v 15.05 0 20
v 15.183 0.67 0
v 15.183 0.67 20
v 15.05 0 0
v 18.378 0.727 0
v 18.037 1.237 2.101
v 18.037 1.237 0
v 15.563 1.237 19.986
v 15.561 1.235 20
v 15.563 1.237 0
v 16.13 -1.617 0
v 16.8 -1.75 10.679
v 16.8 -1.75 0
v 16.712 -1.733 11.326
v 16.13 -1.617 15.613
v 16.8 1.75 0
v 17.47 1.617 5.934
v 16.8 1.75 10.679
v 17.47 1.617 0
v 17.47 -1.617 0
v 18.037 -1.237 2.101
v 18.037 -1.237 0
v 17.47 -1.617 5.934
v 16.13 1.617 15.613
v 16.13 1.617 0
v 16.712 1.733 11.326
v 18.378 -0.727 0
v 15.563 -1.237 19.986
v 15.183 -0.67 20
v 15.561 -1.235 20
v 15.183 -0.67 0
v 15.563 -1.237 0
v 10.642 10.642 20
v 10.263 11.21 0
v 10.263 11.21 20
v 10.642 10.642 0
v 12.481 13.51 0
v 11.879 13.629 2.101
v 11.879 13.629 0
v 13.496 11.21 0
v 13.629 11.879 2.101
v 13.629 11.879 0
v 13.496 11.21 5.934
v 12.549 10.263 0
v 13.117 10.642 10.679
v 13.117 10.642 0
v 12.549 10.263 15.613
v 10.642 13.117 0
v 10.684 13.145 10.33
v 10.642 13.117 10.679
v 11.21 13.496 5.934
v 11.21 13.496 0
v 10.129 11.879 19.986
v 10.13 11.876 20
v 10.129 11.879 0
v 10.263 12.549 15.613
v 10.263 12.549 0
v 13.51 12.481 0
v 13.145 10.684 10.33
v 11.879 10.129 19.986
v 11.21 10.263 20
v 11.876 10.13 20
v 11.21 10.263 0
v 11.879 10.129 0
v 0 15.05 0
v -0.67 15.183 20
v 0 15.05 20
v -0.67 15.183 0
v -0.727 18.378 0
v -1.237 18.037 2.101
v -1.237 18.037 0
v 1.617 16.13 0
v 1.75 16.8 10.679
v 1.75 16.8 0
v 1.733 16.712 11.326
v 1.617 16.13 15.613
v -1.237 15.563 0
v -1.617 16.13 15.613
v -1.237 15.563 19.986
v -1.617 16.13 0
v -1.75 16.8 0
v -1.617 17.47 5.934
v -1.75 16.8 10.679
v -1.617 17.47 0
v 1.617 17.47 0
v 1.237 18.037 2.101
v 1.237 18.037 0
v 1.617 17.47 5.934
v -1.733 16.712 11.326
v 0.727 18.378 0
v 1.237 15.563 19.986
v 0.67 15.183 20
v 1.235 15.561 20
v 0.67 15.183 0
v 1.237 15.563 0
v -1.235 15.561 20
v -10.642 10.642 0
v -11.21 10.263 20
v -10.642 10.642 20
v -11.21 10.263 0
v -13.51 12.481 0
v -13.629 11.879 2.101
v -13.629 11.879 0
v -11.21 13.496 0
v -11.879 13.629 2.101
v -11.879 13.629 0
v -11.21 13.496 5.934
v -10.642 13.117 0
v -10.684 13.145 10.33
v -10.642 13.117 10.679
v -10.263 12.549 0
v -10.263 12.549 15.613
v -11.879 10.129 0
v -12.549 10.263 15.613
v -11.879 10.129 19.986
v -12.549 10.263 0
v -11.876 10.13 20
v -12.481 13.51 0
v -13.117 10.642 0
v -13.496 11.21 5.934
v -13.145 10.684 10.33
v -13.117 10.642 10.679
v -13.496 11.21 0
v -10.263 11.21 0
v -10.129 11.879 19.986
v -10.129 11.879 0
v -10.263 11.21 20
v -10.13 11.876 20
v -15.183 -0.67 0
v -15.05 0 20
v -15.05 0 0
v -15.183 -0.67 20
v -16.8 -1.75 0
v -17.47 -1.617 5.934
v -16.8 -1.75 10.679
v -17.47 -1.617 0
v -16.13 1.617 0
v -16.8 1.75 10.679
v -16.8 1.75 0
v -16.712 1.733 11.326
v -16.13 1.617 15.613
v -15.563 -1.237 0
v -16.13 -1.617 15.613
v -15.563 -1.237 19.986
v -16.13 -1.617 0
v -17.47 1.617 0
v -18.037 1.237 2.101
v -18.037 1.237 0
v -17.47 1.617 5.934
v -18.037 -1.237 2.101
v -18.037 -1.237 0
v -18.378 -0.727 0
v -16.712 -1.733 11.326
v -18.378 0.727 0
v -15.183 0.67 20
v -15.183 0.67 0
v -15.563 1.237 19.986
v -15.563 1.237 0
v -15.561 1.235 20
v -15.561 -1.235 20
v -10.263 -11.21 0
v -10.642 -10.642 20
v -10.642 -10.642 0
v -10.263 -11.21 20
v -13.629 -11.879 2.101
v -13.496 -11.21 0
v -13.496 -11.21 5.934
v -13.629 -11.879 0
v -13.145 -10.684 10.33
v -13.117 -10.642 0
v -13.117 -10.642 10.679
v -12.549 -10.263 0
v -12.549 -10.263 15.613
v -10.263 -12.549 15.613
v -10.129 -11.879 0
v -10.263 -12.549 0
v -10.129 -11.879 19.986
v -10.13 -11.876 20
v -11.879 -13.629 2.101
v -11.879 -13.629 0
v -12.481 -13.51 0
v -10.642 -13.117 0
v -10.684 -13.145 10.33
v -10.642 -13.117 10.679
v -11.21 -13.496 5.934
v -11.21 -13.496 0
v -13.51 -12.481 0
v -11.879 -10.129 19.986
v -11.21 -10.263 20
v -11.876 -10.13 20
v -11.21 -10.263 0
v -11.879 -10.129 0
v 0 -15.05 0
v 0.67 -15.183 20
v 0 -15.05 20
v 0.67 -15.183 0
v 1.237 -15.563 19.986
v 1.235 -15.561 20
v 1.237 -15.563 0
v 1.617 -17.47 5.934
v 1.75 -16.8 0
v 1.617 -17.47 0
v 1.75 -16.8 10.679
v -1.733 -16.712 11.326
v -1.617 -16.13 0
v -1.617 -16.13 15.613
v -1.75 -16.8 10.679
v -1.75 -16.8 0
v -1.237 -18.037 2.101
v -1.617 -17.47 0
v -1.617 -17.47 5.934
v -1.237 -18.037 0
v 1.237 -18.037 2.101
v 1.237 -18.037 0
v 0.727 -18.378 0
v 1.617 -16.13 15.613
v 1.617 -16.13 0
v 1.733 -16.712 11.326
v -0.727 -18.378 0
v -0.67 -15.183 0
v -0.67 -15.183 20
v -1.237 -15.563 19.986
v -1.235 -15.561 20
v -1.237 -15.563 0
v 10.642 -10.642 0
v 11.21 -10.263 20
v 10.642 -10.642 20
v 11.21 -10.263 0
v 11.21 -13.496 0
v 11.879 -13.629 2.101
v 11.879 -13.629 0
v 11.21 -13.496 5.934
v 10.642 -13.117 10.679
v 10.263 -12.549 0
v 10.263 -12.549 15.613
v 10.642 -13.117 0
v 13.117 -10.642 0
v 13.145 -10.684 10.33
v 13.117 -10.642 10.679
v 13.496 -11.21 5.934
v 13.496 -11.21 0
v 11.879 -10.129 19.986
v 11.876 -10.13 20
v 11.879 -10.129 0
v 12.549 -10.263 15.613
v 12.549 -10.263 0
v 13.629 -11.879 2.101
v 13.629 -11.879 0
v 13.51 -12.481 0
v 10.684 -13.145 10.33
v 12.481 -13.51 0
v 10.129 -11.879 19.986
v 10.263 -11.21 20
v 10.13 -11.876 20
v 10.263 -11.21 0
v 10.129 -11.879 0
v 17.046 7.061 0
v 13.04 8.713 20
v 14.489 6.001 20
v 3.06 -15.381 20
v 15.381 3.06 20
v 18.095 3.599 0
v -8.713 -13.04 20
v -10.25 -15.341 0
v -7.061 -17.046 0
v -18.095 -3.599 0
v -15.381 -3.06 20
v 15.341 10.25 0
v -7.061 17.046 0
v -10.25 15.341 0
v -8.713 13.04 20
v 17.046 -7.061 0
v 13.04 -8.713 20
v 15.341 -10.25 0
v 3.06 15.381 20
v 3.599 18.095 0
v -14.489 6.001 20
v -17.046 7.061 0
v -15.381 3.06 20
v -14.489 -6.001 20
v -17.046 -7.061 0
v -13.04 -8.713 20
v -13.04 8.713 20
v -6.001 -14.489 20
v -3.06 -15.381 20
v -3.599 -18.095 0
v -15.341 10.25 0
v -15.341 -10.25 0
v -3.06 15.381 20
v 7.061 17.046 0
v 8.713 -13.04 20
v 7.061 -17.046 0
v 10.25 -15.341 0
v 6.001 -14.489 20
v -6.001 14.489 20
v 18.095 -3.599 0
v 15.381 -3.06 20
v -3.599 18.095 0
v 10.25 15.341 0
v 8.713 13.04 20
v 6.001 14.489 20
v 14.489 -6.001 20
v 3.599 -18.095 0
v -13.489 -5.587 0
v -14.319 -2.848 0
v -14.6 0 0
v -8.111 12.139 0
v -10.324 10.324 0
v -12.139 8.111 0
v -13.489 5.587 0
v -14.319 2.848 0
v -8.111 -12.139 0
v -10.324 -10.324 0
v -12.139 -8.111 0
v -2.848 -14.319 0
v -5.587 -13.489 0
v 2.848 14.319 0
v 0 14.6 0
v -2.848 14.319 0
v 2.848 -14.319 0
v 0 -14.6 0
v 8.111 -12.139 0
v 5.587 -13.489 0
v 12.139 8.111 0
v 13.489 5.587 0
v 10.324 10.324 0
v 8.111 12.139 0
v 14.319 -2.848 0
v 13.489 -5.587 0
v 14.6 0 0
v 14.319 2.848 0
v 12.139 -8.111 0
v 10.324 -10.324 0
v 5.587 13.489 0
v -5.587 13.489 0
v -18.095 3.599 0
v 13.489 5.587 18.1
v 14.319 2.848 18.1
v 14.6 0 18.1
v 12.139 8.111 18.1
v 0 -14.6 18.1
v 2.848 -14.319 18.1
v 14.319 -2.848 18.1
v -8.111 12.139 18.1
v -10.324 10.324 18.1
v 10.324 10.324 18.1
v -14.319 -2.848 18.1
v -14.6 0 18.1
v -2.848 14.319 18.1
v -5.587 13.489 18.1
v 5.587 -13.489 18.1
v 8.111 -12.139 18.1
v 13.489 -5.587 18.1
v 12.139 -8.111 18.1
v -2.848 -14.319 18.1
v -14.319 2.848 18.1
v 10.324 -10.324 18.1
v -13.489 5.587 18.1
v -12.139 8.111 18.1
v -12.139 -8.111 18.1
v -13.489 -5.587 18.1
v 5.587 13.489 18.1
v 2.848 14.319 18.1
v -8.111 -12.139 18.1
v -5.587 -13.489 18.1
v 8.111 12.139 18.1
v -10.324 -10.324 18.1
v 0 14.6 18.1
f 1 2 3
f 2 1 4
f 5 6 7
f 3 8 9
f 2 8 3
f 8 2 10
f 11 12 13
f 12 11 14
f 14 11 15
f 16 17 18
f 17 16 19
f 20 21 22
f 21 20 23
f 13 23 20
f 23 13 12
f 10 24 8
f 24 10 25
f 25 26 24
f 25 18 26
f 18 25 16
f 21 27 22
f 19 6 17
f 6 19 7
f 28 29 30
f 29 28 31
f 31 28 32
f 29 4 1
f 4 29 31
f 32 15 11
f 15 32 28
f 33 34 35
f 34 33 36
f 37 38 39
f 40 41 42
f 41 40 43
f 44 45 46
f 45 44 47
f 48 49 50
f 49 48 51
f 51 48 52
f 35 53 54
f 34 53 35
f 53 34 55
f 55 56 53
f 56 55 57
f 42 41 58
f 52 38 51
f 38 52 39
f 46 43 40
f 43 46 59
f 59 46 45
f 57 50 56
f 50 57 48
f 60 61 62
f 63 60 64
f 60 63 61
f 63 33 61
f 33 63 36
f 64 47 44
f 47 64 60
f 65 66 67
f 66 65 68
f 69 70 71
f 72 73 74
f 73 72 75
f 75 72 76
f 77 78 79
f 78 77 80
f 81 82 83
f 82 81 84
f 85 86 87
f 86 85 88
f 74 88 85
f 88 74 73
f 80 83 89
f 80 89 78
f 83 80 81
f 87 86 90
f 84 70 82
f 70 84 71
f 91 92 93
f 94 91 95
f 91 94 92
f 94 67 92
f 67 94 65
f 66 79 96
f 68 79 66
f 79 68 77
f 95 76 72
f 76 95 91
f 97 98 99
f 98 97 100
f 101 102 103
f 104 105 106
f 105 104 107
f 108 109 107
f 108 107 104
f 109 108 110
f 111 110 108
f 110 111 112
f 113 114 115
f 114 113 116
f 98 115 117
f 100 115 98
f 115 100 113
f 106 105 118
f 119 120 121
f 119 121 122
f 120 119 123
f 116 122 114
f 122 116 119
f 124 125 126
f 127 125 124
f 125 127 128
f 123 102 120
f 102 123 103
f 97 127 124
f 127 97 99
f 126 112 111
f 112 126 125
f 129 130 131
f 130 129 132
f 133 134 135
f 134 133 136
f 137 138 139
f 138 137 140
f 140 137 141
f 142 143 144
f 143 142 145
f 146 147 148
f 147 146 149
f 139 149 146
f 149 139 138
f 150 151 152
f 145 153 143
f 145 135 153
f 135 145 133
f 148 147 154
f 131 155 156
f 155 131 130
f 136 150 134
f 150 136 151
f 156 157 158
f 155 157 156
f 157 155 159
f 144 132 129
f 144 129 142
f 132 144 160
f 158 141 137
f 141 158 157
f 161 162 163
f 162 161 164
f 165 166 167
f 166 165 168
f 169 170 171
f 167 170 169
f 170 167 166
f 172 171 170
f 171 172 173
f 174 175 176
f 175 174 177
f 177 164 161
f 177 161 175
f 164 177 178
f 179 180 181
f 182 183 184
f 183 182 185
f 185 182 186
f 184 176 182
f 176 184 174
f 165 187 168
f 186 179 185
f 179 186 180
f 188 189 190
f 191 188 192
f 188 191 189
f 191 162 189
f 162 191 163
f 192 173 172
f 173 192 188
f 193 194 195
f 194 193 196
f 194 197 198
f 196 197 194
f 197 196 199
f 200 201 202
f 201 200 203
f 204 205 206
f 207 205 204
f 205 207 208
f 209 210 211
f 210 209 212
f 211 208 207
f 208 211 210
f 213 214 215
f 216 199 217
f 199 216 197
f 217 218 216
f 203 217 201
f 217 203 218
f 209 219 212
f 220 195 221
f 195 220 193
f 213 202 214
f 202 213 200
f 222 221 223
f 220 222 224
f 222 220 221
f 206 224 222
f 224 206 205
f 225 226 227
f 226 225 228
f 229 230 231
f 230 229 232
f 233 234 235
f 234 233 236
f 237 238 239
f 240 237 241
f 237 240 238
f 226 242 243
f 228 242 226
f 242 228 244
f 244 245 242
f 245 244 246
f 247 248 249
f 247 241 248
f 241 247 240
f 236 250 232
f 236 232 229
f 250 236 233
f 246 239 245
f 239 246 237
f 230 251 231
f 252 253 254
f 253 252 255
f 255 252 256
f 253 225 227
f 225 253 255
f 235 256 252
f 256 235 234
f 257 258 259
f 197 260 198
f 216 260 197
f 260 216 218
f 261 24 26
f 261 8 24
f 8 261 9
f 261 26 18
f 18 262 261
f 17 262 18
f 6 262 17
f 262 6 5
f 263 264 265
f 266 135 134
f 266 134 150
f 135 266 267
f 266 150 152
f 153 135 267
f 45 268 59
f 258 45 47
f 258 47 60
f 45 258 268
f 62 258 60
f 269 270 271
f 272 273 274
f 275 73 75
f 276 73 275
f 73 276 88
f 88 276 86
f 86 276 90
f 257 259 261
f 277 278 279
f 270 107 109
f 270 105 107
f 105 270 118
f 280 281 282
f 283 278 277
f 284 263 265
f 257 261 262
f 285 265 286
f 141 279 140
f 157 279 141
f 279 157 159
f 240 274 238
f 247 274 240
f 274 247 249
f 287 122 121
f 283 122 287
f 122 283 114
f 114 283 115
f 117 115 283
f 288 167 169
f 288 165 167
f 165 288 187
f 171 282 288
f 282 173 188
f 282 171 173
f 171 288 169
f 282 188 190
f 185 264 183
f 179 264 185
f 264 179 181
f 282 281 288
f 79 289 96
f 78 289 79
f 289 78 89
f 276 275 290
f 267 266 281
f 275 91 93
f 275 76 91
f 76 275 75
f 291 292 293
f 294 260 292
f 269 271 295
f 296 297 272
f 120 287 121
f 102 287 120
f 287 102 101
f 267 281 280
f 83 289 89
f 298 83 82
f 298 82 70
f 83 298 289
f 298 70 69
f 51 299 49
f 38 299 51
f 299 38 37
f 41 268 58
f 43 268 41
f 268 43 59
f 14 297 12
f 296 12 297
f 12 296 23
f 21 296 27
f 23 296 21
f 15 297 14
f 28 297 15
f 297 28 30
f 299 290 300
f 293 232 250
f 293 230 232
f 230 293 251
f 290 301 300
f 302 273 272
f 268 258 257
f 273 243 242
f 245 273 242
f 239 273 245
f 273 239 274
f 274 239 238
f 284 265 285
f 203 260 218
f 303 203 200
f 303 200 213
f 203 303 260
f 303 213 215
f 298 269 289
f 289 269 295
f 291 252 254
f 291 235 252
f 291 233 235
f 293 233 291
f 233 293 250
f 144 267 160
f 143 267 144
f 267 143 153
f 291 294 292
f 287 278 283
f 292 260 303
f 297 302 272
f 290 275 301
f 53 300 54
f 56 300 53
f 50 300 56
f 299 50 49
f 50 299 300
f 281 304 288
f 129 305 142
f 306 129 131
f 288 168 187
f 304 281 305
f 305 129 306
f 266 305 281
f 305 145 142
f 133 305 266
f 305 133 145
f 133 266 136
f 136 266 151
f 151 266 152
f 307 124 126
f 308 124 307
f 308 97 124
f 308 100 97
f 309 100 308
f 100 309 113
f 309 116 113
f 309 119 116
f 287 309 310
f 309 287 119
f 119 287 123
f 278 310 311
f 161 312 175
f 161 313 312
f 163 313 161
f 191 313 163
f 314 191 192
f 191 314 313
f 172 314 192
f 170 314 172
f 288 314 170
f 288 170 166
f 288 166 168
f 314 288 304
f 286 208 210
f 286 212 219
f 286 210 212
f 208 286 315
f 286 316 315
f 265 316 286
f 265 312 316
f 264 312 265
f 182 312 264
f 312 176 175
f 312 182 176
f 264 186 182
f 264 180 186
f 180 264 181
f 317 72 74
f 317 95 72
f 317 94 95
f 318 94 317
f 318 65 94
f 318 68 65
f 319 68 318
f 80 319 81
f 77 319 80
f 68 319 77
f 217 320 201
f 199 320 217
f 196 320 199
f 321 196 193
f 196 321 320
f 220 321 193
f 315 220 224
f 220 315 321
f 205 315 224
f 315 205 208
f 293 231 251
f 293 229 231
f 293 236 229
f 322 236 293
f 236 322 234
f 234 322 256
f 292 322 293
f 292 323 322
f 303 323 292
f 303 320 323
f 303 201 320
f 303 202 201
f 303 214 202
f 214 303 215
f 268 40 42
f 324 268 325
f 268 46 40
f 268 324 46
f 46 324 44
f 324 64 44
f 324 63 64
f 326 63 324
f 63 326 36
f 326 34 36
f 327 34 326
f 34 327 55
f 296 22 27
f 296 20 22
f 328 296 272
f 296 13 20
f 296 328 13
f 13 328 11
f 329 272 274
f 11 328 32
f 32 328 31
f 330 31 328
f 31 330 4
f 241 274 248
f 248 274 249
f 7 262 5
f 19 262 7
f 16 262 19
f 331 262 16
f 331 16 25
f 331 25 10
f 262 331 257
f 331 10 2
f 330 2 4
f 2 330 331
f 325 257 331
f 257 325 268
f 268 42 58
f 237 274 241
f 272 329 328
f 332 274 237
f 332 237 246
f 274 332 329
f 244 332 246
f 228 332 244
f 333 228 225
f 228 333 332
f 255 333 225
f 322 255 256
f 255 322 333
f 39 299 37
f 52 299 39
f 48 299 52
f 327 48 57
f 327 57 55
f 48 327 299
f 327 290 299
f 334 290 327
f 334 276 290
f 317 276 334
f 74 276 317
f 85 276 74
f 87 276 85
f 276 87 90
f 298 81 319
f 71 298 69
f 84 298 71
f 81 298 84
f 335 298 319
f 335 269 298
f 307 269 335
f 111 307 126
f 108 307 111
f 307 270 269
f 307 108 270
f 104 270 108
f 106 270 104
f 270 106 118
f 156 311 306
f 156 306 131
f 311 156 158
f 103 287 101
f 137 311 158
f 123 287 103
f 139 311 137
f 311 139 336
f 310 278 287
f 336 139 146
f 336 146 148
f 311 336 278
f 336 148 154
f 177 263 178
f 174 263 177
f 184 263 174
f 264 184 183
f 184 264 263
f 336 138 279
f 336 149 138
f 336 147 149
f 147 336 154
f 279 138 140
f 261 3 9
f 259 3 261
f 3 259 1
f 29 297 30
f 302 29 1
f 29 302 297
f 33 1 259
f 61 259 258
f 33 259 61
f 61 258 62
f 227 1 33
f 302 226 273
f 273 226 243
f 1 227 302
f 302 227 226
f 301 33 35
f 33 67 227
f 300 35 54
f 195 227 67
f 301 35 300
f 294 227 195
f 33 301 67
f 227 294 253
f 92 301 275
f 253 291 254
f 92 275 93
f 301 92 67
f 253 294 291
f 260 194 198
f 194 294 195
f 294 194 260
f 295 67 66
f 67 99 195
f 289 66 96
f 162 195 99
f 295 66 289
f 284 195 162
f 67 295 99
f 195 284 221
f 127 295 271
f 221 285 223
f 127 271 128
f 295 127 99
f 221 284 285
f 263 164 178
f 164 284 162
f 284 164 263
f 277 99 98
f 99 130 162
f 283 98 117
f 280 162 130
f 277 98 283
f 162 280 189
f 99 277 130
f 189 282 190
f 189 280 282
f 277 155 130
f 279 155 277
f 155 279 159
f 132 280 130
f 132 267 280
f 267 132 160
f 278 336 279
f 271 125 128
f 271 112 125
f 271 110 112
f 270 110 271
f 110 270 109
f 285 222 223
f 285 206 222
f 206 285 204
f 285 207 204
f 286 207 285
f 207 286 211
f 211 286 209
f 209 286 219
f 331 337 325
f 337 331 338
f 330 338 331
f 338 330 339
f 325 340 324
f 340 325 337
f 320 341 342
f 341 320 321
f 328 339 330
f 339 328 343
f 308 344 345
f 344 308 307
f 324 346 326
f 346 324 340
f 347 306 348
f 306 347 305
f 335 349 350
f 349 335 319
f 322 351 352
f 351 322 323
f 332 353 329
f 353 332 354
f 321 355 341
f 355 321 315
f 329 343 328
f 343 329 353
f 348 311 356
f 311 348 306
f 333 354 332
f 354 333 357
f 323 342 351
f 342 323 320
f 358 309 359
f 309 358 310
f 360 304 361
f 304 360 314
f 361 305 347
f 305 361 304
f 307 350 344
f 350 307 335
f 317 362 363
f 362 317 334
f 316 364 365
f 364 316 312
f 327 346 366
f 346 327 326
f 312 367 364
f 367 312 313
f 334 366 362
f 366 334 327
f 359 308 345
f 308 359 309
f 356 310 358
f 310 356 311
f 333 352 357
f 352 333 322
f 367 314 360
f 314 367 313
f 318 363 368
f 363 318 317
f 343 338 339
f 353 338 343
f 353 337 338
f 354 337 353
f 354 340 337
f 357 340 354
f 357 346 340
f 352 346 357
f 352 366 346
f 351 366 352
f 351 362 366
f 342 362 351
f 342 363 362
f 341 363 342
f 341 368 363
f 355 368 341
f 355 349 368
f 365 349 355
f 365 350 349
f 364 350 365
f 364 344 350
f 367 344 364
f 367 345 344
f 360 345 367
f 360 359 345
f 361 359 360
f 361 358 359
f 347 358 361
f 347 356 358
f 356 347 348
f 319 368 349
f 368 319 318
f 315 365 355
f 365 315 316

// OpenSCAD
// ACCESS KNOB — Mutable Instruments Frames Large Center Knob (Slip-On Sleeve)
// Generated via CLI for Studio Knobs (Slip-On Sleeve)
module access_knob_mi_frames_center_slipon() {
  outer_d = 36.9;
  height = 20;
  taper = 0.85;
  bore_d = 28.9;
  slot_h = 18;
  tex_depth = 3.3;
  tex_scale = 3.5;
  tex_count = 8;

  difference() {
    cylinder(h=height, d1=outer_d, d2=outer_d*taper, $fn=32);
    translate([0,0,-0.1]) cylinder(h=slot_h+0.2, d=bore_d + 0.3, $fn=32);
    for(i=[0:tex_count-1]) {
      rotate([0,0,i*(360/tex_count)])
        translate([outer_d/2-tex_depth/2, 0, height/2])
          cylinder(h=height*1.1, d=tex_scale, center=true, $fn=16);
    }
  }
}
access_knob_mi_frames_center_slipon();
